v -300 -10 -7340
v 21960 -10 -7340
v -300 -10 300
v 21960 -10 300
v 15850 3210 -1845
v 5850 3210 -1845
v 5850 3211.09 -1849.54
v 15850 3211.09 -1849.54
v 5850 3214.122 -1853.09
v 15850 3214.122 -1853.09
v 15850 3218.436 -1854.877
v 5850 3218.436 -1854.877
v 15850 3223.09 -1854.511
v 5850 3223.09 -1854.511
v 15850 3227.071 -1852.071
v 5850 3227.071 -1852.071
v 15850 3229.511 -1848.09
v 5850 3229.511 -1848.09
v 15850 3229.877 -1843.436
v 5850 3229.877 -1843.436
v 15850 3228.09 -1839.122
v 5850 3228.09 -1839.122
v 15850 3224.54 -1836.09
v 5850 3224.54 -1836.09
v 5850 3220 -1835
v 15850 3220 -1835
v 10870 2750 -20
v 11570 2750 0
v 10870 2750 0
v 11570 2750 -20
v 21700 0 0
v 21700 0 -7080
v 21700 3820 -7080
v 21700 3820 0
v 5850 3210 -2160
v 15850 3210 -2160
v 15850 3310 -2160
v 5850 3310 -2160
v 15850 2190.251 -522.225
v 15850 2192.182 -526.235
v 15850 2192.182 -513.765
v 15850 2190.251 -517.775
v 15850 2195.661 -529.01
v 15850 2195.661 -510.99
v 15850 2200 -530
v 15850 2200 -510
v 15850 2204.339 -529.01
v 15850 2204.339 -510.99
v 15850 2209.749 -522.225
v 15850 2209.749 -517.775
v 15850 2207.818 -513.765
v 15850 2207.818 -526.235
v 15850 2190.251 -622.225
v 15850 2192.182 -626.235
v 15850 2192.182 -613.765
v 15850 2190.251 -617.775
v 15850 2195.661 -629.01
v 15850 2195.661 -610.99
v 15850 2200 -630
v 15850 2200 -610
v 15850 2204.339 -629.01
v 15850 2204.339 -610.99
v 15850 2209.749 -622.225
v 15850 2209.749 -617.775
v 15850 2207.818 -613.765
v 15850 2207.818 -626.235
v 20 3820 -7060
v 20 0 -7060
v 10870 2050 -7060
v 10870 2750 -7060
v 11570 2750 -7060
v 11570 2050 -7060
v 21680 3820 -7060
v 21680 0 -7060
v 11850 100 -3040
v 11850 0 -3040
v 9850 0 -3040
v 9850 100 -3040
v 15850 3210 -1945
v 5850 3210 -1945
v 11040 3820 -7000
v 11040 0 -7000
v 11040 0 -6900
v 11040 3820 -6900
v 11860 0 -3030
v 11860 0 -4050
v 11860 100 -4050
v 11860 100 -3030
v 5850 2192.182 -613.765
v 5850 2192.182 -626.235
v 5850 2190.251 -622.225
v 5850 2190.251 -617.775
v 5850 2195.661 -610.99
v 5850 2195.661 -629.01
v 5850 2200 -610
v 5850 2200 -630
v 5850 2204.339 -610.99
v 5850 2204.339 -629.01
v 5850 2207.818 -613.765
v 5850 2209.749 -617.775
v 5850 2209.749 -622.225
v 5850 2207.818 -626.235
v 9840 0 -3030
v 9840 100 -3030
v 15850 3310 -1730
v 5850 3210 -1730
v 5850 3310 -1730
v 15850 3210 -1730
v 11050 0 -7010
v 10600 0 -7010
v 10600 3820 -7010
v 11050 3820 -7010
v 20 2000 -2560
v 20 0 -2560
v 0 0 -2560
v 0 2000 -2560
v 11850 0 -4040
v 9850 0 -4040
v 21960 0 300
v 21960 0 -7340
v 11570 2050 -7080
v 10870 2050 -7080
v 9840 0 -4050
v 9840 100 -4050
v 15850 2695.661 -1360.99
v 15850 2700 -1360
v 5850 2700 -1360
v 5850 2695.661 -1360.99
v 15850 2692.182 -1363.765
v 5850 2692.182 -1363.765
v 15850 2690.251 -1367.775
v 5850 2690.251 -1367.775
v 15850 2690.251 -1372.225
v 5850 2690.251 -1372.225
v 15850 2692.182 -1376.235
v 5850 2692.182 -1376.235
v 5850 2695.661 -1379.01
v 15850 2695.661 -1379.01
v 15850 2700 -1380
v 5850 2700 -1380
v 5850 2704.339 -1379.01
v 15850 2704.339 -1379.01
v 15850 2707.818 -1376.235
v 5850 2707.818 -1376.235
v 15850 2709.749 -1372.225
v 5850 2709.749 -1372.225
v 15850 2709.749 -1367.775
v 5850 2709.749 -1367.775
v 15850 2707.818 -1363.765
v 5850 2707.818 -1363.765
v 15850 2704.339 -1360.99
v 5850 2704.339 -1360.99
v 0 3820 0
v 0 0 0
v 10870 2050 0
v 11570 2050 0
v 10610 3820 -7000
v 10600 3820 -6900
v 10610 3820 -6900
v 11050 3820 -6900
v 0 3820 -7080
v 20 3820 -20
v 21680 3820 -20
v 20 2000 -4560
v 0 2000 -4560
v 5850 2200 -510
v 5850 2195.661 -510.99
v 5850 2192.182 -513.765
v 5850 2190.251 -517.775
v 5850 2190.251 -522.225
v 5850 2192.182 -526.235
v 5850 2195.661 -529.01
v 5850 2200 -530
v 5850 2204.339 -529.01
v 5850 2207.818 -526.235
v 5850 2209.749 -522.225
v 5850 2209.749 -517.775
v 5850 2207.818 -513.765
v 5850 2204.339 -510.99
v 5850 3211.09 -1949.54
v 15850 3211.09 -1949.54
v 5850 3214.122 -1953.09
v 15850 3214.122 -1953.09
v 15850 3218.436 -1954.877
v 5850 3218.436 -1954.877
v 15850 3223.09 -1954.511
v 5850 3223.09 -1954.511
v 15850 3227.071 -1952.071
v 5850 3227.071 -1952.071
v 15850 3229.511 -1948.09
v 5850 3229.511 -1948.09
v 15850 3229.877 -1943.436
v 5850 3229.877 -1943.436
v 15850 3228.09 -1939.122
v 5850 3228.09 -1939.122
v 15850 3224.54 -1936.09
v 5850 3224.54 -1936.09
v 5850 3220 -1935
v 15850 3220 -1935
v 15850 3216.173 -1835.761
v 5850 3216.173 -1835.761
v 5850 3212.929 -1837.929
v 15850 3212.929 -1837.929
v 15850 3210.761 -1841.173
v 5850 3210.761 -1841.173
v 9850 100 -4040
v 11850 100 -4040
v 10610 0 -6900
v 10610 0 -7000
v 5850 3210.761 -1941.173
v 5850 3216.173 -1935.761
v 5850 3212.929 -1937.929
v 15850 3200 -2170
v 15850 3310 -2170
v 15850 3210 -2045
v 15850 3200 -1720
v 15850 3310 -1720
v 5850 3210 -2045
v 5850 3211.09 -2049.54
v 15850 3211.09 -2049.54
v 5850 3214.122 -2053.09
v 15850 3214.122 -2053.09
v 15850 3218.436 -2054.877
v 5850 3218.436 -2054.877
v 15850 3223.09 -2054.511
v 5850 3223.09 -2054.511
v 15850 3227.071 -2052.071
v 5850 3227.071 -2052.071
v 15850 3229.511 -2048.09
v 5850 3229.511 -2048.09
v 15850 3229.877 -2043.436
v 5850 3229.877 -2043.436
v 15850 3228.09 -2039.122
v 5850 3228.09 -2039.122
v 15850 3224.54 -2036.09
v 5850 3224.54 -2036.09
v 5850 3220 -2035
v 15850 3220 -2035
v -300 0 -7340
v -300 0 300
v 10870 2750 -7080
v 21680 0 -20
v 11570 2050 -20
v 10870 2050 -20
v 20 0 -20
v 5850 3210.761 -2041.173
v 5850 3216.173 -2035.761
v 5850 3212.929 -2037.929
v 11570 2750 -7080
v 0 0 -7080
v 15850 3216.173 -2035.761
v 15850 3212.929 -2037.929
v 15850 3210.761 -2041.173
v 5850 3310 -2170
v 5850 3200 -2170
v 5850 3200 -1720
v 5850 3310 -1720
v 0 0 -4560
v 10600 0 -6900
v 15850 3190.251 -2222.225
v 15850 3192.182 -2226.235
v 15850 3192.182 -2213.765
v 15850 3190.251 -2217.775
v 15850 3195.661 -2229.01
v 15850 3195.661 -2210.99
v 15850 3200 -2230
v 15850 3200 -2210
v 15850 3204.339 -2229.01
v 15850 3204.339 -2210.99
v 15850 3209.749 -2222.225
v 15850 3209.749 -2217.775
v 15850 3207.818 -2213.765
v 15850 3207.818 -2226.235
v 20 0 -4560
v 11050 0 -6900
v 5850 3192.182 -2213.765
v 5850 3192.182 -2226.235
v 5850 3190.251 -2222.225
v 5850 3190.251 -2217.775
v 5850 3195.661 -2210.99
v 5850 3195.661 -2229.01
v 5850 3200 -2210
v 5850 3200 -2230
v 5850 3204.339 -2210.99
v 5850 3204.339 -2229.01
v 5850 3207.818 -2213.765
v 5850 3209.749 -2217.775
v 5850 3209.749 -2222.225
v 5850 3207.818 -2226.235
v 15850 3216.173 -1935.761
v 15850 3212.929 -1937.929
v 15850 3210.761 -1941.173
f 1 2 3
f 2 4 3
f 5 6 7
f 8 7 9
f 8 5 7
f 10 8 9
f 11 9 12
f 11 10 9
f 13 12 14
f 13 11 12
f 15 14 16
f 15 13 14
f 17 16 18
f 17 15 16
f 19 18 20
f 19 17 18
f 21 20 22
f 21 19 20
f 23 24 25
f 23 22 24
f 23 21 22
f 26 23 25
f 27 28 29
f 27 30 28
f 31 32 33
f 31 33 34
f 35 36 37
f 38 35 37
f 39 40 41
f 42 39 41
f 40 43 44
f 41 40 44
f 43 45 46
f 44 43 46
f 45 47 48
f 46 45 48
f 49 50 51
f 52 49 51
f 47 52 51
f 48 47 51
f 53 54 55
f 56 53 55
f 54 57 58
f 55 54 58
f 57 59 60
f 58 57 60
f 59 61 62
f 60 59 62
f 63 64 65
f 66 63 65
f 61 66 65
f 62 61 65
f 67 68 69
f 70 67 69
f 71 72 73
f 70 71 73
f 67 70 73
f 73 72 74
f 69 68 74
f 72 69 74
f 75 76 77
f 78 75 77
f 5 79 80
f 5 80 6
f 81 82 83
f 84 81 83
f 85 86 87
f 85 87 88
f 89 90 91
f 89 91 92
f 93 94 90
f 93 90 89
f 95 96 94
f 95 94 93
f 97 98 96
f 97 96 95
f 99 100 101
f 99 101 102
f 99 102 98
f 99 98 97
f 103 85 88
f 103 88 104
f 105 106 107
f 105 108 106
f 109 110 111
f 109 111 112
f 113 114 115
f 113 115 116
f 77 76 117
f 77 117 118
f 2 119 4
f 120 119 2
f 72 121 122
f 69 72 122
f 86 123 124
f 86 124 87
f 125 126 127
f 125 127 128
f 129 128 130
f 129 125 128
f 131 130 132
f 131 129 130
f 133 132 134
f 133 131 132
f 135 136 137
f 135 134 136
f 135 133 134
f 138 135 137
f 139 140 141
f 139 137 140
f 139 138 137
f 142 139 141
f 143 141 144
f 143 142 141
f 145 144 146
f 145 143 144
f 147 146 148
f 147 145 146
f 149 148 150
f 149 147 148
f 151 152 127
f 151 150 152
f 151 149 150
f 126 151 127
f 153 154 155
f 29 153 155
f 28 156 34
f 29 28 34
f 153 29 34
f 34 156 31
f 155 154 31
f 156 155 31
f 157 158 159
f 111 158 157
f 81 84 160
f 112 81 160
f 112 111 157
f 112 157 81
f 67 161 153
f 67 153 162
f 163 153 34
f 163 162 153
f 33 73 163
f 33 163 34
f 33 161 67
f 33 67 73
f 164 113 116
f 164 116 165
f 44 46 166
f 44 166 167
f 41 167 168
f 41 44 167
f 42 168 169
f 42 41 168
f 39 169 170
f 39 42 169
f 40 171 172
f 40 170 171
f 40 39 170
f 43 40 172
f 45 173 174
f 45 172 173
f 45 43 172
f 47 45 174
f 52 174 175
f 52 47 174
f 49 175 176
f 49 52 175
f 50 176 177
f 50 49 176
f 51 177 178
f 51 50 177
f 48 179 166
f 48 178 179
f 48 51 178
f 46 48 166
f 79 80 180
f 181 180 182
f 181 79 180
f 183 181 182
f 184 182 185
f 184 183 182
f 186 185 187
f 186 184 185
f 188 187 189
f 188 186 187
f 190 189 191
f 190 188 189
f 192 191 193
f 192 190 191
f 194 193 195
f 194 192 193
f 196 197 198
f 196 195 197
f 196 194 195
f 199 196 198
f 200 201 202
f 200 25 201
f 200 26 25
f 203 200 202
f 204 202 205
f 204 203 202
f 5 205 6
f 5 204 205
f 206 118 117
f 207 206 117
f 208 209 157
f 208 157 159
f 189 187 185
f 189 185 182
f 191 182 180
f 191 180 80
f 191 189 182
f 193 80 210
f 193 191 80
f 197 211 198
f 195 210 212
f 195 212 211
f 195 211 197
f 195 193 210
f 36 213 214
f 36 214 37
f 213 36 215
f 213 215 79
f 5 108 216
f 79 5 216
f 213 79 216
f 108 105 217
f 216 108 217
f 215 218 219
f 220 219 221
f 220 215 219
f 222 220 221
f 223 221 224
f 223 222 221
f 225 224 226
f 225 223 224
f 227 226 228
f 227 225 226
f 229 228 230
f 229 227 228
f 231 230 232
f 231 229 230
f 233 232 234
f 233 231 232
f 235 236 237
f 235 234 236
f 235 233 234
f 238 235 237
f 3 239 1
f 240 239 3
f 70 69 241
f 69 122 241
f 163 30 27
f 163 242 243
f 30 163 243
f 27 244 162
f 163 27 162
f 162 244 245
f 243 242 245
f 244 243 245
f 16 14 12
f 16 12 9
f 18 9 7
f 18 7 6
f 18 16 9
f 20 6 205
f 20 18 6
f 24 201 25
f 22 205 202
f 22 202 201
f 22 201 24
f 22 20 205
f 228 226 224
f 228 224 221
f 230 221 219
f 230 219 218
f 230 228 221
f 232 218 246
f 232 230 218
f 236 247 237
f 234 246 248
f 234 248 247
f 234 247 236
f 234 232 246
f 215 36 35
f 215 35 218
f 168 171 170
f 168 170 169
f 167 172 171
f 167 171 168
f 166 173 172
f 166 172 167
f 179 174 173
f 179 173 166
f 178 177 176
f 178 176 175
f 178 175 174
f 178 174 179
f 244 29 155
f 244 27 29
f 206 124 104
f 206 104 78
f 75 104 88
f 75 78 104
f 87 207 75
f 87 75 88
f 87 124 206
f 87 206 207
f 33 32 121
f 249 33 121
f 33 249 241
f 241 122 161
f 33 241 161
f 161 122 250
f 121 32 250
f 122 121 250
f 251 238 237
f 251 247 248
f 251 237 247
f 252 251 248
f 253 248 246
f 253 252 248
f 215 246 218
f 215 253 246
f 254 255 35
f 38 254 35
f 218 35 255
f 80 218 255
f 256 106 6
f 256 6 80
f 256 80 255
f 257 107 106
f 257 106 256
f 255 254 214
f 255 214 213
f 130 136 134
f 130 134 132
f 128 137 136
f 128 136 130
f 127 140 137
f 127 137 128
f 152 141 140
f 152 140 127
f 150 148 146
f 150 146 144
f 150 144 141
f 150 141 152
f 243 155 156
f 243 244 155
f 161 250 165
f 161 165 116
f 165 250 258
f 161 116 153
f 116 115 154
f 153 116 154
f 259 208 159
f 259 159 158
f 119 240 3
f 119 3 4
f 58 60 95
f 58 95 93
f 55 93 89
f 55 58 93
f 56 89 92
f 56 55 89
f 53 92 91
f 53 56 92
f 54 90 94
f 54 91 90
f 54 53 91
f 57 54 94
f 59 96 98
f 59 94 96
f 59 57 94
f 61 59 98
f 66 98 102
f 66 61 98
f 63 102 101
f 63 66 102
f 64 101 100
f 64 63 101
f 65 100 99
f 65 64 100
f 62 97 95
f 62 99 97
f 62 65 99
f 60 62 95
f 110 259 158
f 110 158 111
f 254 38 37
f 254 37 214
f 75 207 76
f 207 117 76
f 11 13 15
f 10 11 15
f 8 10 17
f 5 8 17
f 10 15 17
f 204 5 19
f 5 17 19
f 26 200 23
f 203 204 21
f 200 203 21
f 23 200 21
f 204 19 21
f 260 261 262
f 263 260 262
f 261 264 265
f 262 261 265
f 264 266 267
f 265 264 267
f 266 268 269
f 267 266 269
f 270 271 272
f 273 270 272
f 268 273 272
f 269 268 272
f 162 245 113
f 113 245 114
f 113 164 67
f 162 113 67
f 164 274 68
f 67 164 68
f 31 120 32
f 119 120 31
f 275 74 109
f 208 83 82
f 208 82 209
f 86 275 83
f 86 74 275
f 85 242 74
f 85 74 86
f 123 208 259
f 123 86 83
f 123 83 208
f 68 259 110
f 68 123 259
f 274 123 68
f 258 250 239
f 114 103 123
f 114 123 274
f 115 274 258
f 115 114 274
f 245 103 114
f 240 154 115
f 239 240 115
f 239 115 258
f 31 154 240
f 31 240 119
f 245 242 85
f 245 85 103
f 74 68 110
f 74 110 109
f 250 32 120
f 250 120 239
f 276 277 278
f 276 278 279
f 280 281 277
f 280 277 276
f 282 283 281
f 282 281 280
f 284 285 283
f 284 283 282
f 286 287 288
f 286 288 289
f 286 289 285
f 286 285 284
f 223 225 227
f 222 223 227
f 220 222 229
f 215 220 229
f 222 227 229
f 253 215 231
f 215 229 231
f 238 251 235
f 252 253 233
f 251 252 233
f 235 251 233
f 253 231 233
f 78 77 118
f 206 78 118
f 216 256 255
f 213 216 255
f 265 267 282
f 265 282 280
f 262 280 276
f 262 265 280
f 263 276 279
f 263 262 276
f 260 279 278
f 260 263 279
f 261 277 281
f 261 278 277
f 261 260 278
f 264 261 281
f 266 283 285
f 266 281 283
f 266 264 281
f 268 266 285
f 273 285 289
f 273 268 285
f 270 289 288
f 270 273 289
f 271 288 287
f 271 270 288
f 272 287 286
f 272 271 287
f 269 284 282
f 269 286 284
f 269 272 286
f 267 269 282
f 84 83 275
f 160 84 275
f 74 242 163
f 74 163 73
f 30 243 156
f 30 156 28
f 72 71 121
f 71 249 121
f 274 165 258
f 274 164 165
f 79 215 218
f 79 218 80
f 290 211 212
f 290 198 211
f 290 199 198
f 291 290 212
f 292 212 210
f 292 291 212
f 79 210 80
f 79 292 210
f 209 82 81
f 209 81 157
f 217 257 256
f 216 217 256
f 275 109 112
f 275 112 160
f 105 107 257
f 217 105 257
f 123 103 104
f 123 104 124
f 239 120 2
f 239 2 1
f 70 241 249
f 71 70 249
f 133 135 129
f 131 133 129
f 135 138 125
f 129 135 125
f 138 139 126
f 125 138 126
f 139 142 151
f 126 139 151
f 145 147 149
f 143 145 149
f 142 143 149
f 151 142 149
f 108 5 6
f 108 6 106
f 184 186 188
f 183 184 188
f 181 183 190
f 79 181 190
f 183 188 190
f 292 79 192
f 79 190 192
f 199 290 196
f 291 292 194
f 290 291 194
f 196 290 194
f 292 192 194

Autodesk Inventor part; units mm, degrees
ref_plane "YZ Plane" through (0, 0, 0) normal (1, 0, 0) x (0, 1, 0)
ref_plane "XZ Plane" through (0, 0, 0) normal (0, 1, 0) x (-1, 0, 0)
sketch "Sketch1" plane through (0, 0, 0) normal (0, 1, 0) x (-1, 0, 0)
  line L0 (300, 300) -> (-21960, 300)
  line L1 (-21960, 300) -> (-21960, -7340)
  line L2 (-21960, -7340) -> (300, -7340)
  line L3 (300, -7340) -> (300, 300)
  point P0 (0, 0)
  dimension "d0" = 300
  dimension "d1" = 22260
  dimension "d2" = 300
  dimension "d3" = 7640
extrude "Extrusion2" add sketch "Sketch1" against normal blind 10
sketch "Sketch4" plane through (0, 0, 0) normal (0, 1, 0) x (1, 0, 0)
  line L0 (0, 0) -> (21700, 0)
  line L1 (21700, 0) -> (21700, 20)
  line L2 (21700, 20) -> (0, 20)
  line L3 (0, 20) -> (0, 0)
  dimension "d28" = 20
  dimension "d30" = 21700
extrude "Extrusion4" add sketch "Sketch4" along normal blind 3820
sketch "Sketch5" plane through (0, 0, 0) normal (0, 1, 0) x (1, 0, 0)
  line L0 (0, 20) -> (21700, 20) projected
  line L1 (0, 20) -> (20, 20)
  line L2 (20, 20) -> (20, 7060)
  line L3 (20, 7060) -> (0, 7060)
  line L4 (0, 7060) -> (0, 20)
  dimension "d33" = 20
  dimension "d35" = 7040
extrude "Extrusion5" add sketch "Sketch5" along normal blind 3820
sketch "Sketch6" plane through (0, 0, 0) normal (0, 1, 0) x (1, 0, 0)
  line L0 (0, 7060) -> (21700, 7060)
  line L1 (21700, 7060) -> (21700, 7080)
  line L2 (21700, 7080) -> (0, 7080)
  line L3 (0, 7080) -> (0, 7060)
  dimension "d38" = 20
  dimension "d40" = 21700
extrude "Extrusion6" add sketch "Sketch6" along normal blind 3820
sketch "Sketch7" plane through (0, 0, 0) normal (0, 1, 0) x (1, 0, 0)
  line L0 (0, 20) -> (21700, 20) projected
  line L1 (21700, 20) -> (21680, 20)
  line L2 (21680, 20) -> (21680, 7060)
  line L3 (21680, 7060) -> (21700, 7060)
  line L4 (21700, 7060) -> (21700, 20)
  point P0 (20, 20)
  dimension "d43" = 20
  dimension "d45" = 7040
extrude "Extrusion7" add sketch "Sketch7" along normal blind 3820
sketch "Sketch10" plane through (20, 0, -20) normal (1, 0, 0) x (0, 0, -1)
  line L0 (7040, 0) -> (0, 0) projected
  line L1 (7040, 0) -> (7040, 3820) projected
  line L2 (0, 3820) -> (7040, 3820) projected
  line L3 (0, 0) -> (0, 3820) projected
  point P0 (-20, 0)
sketch "Sketch11" plane through (0, 0, 0) normal (-1, 0, 0) x (0, 0, 1)
  line L0 (0, 0) -> (-7080, 0) projected
  line L1 (-7080, 0) -> (-7080, 3820) projected
  line L2 (-4560, 0) -> (-2560, 0)
  line L3 (-2560, 0) -> (-2560, 2000)
  line L4 (-2560, 2000) -> (-4560, 2000)
  line L5 (-4560, 2000) -> (-4560, 0)
  dimension "d73" = 2000
  dimension "d75" = 2000
  dimension "d76" = 2520
extrude "Extrusion10" cut sketch "Sketch11" along normal mid plane 40
sketch "Sketch12" plane through (0, 0, 0) normal (0, 0, 1) x (1, 0, 0)
  line L0 (21700, 0) -> (0, 0) projected
  line L1 (0, 0) -> (0, 3820) projected
  line L2 (10870, 2050) -> (11570, 2050)
  line L3 (11570, 2050) -> (11570, 2750)
  line L4 (11570, 2750) -> (10870, 2750)
  line L5 (10870, 2750) -> (10870, 2050)
  line L6 (10870, 2050) -> (11570, 2750) construction
  line L7 (11570, 2050) -> (10870, 2750) construction
  point P0 (11220, 2400)
  dimension "d79" = 2400
  dimension "d80" = 700
  dimension "d81" = 700
  dimension "d82" = 11220
extrude "Extrusion11" cut sketch "Sketch12" along normal mid plane 40
sketch "Sketch13" plane through (21700, 0, -7080) normal (0, 0, -1) x (-1, 0, 0)
  line L0 (21700, 0) -> (0, 0) projected
  line L1 (21700, 0) -> (21700, 3820) projected
  line L2 (10130, 2050) -> (10830, 2050)
  line L3 (10830, 2050) -> (10830, 2750)
  line L4 (10830, 2750) -> (10130, 2750)
  line L5 (10130, 2750) -> (10130, 2050)
  line L6 (10130, 2050) -> (10830, 2750) construction
  line L7 (10830, 2050) -> (10130, 2750) construction
  point P0 (10480, 2400)
  dimension "d85" = 11220
  dimension "d86" = 2400
  dimension "d87" = 700
  dimension "d88" = 700
extrude "Extrusion12" cut sketch "Sketch13" against normal blind 40
sketch "Sketch14" plane through (0, 0, 0) normal (0, 1, 0) x (1, 0, 0)
  line L0 (21680, 7060) -> (20, 7060) projected
  line L1 (20, 7060) -> (20, 4560) projected
  line L2 (11850, 3040) -> (9850, 3040)
  line L3 (9850, 3040) -> (9850, 4040)
  line L4 (9850, 4040) -> (11850, 4040)
  line L5 (11850, 4040) -> (11850, 3040)
  line L6 (11850, 3040) -> (9850, 4040) construction
  line L7 (9850, 3040) -> (11850, 4040) construction
  line L8 (9840, 4050) -> (11860, 4050)
  line L9 (11860, 4050) -> (11860, 3030)
  line L10 (11860, 3030) -> (9840, 3030)
  line L11 (9840, 3030) -> (9840, 4050)
  point P0 (10850, 3540)
  point P1 (0, 7060)
  dimension "d91" = 10830
  dimension "d92" = 3520
  dimension "d93" = 2000
  dimension "d94" = 1000
  dimension "d95" = 10
  dimension "d96" = 10
  dimension "d97" = 10
  dimension "d98" = 10
extrude "Extrusion13" add sketch "Sketch14" along normal blind 100
ref_plane "Work Plane1" through (15850, 0, -7060) normal (-1, 0, 0) x (0, 0, 1)
sketch "Sketch16" plane through (15850, 0, -7060) normal (-1, 0, 0) x (0, 0, 1)
  circle A0 centre (4840, 3200) radius 10
  line L0 (-280, 0) -> (7360, 0) projected
  line L1 (7040, 0) -> (7040, 3820) projected
  line L2 (4890, 3210) -> (5340, 3210)
  line L3 (5340, 3210) -> (5340, 3200)
  line L4 (5340, 3200) -> (4890, 3200)
  line L5 (4890, 3200) -> (4890, 3210)
  line L6 (4890, 3210) -> (4900, 3210)
  line L7 (4900, 3210) -> (4900, 3310)
  line L8 (4900, 3310) -> (4890, 3310)
  line L9 (4890, 3310) -> (4890, 3210)
  line L10 (5340, 3210) -> (5330, 3210)
  line L11 (5330, 3210) -> (5330, 3310)
  line L12 (5330, 3310) -> (5340, 3310)
  line L13 (5340, 3310) -> (5340, 3210)
  circle A1 centre (5015, 3220) radius 10
  circle A2 centre (5115, 3220) radius 10
  circle A3 centre (5215, 3220) radius 10
  circle A4 centre (5690, 2700) radius 10
  circle A5 centre (6440, 2200) radius 10
  circle A6 centre (6540, 2200) radius 10
  point P0 (7060, 0)
  dimension "d102" = 3200
  dimension "d103" = 2200
  dimension "d104" = 20
  dimension "d105" = 10
  dimension "d106" = 50
  dimension "d107" = 0
  dimension "d108" = 450
  dimension "d109" = 10
  dimension "d110" = 100
  dimension "d111" = 10
  dimension "d112" = 100
  dimension "d113" = 20
  dimension "d114" = 20
  dimension "d115" = 20
  dimension "d116" = 10
  dimension "d117" = 10
  dimension "d118" = 10
  dimension "d119" = 225
  dimension "d120" = 100
  dimension "d121" = 100
  dimension "d122" = 2700
  dimension "d123" = 1350
  dimension "d124" = 20
  dimension "d125" = 2200
  dimension "d126" = 2200
  dimension "d127" = 600
  dimension "d128" = 500
  dimension "d129" = 20
  dimension "d130" = 20
extrude "Extrusion14" add sketch "Sketch16" along normal blind 10000
sketch "Sketch17" plane through (0, 0, 0) normal (0, 1, 0) x (1, 0, 0)
  line L0 (21680, 7060) -> (20, 7060) projected
  line L1 (20, 7060) -> (20, 4560) projected
  line L2 (10600, 7010) -> (11050, 7010)
  line L3 (11050, 7010) -> (11050, 7000)
  line L4 (11050, 7000) -> (10600, 7000)
  line L5 (10600, 7000) -> (10600, 7010)
  line L6 (10600, 7000) -> (10610, 7000)
  line L7 (10610, 7000) -> (10610, 6900)
  line L8 (10610, 6900) -> (10600, 6900)
  line L9 (10600, 6900) -> (10600, 7000)
  line L10 (11050, 7000) -> (11040, 7000)
  line L11 (11040, 7000) -> (11040, 6900)
  line L12 (11040, 6900) -> (11050, 6900)
  line L13 (11050, 6900) -> (11050, 7000)
  dimension "d133" = 450
  dimension "d135" = 10
  dimension "d136" = 10
  dimension "d137" = 10
  dimension "d139" = 100
  dimension "d140" = 100
  dimension "d141" = 50
  dimension "d142" = 10580
extrude "Extrusion15" add sketch "Sketch17" along normal blind 3820
properties part number "NIST_NRC_Drawing"
